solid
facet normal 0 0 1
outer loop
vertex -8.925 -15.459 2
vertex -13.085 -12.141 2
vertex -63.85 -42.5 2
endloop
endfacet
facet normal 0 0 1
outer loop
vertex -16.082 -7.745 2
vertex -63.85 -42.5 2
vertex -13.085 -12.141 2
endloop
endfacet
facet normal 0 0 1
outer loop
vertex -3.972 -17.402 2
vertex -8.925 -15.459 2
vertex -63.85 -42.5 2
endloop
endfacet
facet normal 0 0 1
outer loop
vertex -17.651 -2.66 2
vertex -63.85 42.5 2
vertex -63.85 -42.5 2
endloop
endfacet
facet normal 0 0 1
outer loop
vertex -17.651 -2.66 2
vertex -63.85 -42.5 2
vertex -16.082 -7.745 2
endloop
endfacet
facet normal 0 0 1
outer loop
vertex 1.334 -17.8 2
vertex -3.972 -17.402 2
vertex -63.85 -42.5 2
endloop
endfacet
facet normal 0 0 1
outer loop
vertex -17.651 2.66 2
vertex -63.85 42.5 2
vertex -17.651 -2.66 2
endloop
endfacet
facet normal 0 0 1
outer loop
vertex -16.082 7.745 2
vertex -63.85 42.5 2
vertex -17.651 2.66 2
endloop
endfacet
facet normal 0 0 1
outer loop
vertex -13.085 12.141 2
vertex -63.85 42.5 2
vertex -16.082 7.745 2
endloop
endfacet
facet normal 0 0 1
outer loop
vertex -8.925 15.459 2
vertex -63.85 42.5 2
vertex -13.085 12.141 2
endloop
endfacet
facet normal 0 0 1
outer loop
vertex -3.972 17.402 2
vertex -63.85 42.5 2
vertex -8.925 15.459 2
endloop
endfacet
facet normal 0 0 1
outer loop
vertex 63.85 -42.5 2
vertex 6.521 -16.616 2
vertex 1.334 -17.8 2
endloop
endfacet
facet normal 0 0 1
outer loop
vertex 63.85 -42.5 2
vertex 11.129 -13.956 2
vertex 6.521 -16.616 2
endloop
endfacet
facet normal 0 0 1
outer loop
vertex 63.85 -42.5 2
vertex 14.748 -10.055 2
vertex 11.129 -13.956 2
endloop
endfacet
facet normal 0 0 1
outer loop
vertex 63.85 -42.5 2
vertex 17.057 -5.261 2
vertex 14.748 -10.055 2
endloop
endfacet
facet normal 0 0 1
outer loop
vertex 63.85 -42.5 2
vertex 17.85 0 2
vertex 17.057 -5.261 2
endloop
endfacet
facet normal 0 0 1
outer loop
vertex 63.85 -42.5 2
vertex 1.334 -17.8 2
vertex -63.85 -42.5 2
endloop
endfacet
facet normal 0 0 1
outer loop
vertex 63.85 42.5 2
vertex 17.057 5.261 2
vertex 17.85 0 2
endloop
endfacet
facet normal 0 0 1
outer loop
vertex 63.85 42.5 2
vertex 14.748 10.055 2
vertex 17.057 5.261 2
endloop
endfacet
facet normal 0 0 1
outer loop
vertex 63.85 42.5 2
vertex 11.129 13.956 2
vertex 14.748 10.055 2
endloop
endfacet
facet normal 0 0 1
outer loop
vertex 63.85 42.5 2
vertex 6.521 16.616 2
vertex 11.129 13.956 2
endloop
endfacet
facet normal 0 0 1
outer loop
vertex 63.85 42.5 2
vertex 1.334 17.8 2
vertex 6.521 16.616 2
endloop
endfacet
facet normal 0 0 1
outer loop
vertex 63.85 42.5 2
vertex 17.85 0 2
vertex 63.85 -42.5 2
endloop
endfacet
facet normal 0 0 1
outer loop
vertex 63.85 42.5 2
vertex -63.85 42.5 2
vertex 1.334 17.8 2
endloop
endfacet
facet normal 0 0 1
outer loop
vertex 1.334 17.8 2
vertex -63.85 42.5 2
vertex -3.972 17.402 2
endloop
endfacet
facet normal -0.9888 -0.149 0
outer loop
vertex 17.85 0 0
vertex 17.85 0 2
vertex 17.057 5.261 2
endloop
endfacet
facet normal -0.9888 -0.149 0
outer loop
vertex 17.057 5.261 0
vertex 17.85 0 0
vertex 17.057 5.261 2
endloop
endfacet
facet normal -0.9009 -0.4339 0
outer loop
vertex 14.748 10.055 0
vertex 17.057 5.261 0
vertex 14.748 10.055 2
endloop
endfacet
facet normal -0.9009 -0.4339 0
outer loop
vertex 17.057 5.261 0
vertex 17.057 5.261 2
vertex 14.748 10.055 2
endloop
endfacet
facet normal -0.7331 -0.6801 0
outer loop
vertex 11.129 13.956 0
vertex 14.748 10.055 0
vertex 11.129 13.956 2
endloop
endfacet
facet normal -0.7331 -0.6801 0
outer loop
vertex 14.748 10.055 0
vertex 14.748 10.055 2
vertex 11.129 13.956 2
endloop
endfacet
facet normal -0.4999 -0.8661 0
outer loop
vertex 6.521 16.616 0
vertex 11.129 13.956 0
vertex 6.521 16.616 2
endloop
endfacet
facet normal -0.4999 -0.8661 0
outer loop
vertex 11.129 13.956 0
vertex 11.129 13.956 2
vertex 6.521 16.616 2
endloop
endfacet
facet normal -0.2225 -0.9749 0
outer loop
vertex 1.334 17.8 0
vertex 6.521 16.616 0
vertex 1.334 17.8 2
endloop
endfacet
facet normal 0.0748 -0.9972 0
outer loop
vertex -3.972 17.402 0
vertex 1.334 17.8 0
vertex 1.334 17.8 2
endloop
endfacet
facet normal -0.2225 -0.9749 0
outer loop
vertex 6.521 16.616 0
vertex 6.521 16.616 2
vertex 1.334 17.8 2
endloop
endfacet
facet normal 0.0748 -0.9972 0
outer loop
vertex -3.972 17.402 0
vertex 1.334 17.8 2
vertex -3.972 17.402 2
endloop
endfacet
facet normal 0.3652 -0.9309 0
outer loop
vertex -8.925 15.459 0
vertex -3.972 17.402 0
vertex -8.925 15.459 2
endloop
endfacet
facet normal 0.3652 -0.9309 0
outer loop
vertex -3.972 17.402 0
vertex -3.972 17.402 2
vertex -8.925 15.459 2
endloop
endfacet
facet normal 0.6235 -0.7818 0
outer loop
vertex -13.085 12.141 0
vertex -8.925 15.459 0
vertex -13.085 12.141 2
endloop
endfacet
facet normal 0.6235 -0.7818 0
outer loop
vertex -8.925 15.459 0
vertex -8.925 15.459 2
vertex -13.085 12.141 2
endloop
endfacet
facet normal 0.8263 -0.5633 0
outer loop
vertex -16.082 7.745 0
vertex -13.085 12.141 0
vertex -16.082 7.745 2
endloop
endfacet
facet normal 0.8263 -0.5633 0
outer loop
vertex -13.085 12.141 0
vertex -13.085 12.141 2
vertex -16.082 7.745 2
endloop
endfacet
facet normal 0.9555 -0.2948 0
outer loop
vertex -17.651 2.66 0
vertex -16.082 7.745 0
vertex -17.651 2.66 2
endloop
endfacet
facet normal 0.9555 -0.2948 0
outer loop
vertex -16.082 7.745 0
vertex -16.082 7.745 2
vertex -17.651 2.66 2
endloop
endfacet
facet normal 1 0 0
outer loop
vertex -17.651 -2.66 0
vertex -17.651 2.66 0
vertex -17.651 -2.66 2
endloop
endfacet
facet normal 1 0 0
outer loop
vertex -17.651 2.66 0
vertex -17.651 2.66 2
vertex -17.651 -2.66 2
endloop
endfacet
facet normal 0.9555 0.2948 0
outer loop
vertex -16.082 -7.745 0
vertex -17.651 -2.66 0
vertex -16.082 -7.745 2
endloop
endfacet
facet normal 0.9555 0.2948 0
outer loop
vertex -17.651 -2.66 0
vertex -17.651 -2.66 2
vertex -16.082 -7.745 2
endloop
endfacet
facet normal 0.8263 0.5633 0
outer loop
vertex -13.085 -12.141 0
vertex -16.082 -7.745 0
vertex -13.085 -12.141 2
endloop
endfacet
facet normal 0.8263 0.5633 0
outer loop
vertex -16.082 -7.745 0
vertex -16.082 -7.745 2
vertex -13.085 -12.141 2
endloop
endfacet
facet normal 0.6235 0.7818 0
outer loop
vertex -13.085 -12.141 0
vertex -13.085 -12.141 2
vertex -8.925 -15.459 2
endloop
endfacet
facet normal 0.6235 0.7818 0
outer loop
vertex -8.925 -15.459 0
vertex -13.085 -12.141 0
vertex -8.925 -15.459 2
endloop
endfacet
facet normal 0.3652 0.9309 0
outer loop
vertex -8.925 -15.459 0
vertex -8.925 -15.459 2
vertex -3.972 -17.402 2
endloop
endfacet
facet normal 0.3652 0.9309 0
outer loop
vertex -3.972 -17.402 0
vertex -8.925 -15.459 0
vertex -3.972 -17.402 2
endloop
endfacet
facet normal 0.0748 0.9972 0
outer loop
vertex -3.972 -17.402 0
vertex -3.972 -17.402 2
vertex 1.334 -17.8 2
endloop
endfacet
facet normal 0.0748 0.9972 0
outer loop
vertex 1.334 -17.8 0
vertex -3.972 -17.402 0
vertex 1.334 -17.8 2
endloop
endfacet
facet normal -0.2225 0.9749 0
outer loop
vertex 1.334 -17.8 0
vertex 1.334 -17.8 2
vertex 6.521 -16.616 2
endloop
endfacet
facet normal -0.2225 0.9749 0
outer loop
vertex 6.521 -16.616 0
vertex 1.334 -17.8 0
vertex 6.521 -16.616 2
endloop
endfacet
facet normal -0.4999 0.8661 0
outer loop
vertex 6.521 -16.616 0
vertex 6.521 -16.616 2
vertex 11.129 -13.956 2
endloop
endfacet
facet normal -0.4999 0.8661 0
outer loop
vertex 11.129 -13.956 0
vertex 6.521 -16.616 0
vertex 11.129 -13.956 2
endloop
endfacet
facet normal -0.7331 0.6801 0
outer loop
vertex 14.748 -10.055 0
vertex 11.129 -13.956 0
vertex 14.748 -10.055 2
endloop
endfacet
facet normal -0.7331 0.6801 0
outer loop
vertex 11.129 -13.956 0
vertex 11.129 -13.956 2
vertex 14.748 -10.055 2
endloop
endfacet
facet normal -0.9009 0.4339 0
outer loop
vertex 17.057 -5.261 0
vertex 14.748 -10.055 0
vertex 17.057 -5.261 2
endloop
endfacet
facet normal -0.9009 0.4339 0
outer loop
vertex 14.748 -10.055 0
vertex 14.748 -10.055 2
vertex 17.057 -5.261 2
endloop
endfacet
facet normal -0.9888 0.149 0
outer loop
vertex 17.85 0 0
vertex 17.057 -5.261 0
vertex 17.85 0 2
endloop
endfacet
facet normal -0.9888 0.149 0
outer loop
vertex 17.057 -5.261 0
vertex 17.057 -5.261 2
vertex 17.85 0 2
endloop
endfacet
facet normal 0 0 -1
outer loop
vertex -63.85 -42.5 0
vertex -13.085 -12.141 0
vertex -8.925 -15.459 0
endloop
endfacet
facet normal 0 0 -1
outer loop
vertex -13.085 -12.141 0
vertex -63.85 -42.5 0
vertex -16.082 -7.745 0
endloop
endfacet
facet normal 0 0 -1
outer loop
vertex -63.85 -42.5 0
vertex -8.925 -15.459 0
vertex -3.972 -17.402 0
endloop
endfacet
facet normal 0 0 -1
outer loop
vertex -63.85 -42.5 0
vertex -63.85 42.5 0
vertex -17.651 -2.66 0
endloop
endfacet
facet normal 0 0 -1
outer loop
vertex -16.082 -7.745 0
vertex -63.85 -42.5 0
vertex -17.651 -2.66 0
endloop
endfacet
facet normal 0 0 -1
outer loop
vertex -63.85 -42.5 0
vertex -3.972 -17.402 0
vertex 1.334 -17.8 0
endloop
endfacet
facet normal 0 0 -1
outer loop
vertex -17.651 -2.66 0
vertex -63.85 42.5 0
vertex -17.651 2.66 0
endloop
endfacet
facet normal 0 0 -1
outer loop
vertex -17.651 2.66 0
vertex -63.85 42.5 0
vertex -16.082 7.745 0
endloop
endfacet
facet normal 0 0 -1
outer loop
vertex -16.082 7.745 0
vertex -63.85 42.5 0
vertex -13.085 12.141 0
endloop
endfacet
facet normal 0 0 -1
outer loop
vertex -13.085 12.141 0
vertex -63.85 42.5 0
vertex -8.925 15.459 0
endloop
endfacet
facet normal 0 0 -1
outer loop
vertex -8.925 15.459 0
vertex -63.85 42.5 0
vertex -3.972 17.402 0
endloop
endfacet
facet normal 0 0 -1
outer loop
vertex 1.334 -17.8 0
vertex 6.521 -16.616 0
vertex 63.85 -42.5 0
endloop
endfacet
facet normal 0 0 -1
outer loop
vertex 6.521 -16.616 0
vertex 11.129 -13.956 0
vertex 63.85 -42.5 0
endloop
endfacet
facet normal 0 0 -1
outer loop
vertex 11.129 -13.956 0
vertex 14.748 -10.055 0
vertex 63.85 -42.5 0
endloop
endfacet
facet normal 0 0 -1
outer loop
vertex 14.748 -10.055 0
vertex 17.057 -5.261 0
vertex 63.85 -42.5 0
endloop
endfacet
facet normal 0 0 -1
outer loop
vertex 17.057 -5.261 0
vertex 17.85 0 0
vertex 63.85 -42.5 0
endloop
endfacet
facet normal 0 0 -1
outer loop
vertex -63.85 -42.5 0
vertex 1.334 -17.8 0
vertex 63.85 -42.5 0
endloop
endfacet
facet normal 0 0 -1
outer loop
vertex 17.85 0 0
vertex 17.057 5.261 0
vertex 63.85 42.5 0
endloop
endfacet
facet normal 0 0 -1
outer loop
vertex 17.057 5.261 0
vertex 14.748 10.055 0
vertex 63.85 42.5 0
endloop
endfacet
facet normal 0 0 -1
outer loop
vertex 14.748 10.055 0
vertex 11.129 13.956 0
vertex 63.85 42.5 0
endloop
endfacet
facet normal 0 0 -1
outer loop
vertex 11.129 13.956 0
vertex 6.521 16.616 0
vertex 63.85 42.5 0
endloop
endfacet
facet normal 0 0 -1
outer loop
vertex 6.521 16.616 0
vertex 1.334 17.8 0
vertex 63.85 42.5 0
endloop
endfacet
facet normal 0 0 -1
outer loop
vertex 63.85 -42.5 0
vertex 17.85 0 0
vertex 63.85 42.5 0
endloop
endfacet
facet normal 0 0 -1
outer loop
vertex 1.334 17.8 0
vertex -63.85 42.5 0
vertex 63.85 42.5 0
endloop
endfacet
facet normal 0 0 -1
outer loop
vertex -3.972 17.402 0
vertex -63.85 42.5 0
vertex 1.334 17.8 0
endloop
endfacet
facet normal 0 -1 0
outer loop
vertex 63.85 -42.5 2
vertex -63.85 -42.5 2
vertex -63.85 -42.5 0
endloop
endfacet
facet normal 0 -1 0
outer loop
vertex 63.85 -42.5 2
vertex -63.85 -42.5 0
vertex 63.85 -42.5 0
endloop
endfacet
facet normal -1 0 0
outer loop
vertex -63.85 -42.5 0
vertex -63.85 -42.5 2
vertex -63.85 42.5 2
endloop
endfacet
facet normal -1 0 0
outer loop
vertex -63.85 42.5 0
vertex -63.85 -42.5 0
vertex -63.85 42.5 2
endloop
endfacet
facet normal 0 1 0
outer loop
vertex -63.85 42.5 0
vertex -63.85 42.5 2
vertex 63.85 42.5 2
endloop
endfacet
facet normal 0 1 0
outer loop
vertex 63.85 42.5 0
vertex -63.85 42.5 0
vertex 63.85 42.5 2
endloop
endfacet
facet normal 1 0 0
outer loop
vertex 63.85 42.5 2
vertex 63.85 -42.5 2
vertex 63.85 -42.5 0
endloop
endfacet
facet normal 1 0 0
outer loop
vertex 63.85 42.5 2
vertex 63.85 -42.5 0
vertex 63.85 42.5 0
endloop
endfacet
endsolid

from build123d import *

# Parameters (mm, degrees)
F2_W     = 127.7
F2_H     = 85
F2_R     = 17.85
F3_DEPTH = 2


# Not quite as in the source:
# - a feature names something its author has since deleted; it is built from what else it names


with BuildPart() as f3:
    # F2 (on offset) → F3 (new body)
    with BuildSketch(Plane.XY.offset(2)):
        Rectangle(F2_W, F2_H)
        Circle(F2_R, mode=Mode.SUBTRACT)
    extrude(amount=-F3_DEPTH)


solid = f3.part
